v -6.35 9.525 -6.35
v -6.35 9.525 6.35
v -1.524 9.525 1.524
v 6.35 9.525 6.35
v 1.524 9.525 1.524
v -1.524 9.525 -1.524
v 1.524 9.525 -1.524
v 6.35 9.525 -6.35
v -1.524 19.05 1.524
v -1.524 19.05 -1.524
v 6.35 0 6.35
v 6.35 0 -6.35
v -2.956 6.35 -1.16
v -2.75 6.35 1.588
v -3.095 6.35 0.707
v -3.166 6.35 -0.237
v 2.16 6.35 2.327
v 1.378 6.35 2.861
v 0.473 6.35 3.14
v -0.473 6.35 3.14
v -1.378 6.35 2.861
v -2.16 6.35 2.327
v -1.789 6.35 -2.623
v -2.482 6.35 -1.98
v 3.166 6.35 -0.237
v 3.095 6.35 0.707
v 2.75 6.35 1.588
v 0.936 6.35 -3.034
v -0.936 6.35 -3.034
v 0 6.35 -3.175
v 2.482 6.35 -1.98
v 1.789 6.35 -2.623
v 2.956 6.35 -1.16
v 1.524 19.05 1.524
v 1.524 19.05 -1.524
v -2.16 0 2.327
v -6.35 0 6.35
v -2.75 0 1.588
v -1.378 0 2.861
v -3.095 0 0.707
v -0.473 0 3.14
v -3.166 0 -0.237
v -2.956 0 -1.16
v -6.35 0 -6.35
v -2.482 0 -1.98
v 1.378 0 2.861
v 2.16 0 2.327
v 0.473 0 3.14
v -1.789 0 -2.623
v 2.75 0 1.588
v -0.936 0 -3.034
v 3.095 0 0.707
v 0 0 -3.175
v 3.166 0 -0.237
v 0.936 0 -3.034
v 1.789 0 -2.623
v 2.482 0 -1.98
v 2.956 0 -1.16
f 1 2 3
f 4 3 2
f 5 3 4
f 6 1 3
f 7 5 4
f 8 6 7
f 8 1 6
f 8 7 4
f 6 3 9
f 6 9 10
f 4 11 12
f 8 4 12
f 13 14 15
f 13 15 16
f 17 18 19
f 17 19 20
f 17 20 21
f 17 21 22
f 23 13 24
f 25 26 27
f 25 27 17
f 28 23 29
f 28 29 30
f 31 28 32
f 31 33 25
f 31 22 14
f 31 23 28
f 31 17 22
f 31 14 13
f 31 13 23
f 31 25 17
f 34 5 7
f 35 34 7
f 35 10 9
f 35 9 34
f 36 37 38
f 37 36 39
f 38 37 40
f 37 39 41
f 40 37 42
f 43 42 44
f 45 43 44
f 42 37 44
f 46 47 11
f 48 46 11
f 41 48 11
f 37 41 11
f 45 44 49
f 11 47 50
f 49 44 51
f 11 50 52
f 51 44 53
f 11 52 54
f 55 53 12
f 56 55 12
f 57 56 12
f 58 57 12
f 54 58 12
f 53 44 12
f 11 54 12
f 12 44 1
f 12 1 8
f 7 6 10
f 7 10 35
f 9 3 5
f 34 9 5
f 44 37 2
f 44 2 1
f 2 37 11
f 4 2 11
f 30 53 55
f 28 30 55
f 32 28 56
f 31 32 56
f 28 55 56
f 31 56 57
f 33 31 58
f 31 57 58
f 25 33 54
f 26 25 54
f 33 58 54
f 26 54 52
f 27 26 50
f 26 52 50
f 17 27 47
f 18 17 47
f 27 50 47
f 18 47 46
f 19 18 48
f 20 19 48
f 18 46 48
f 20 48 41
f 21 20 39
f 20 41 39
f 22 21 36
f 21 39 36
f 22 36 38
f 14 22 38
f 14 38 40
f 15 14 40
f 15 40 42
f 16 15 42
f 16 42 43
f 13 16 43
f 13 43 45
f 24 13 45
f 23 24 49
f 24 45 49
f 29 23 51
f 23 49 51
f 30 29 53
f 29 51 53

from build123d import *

# Parameters (mm, degrees)
SKETCH1_W           = 12.7
SKETCH1_H           = 12.7
BOSS_EXTRUDE1_DEPTH = 9.525
SKETCH3_W           = 3.048
SKETCH3_H           = 3.048
BOSS_EXTRUDE2_DEPTH = 9.525
SKETCH4_R           = 3.175
CUT_EXTRUDE1_DEPTH  = 6.35


with BuildPart() as part:
    # Sketch1 → Boss-Extrude1 (new body)
    with BuildSketch(Plane(origin=(0, 0, 0), x_dir=(1, 0, 0), z_dir=(0, 1, 0))):
        Rectangle(SKETCH1_W, SKETCH1_H)
    extrude(amount=BOSS_EXTRUDE1_DEPTH)

    # Sketch3 → Boss-Extrude2 (add)
    with BuildSketch(Plane(origin=(0, 9.525, 0), x_dir=(1, 0, 0), z_dir=(0, 1, 0))):
        Rectangle(SKETCH3_W, SKETCH3_H)
    extrude(amount=BOSS_EXTRUDE2_DEPTH)

    # Sketch4 → Cut-Extrude1 (cut)
    with BuildSketch(Plane.XZ):
        with Locations(Location((0, 0, 0), (0, 0, 270))):
            Circle(SKETCH4_R)
    extrude(amount=-CUT_EXTRUDE1_DEPTH, mode=Mode.SUBTRACT)


solid = part.part
